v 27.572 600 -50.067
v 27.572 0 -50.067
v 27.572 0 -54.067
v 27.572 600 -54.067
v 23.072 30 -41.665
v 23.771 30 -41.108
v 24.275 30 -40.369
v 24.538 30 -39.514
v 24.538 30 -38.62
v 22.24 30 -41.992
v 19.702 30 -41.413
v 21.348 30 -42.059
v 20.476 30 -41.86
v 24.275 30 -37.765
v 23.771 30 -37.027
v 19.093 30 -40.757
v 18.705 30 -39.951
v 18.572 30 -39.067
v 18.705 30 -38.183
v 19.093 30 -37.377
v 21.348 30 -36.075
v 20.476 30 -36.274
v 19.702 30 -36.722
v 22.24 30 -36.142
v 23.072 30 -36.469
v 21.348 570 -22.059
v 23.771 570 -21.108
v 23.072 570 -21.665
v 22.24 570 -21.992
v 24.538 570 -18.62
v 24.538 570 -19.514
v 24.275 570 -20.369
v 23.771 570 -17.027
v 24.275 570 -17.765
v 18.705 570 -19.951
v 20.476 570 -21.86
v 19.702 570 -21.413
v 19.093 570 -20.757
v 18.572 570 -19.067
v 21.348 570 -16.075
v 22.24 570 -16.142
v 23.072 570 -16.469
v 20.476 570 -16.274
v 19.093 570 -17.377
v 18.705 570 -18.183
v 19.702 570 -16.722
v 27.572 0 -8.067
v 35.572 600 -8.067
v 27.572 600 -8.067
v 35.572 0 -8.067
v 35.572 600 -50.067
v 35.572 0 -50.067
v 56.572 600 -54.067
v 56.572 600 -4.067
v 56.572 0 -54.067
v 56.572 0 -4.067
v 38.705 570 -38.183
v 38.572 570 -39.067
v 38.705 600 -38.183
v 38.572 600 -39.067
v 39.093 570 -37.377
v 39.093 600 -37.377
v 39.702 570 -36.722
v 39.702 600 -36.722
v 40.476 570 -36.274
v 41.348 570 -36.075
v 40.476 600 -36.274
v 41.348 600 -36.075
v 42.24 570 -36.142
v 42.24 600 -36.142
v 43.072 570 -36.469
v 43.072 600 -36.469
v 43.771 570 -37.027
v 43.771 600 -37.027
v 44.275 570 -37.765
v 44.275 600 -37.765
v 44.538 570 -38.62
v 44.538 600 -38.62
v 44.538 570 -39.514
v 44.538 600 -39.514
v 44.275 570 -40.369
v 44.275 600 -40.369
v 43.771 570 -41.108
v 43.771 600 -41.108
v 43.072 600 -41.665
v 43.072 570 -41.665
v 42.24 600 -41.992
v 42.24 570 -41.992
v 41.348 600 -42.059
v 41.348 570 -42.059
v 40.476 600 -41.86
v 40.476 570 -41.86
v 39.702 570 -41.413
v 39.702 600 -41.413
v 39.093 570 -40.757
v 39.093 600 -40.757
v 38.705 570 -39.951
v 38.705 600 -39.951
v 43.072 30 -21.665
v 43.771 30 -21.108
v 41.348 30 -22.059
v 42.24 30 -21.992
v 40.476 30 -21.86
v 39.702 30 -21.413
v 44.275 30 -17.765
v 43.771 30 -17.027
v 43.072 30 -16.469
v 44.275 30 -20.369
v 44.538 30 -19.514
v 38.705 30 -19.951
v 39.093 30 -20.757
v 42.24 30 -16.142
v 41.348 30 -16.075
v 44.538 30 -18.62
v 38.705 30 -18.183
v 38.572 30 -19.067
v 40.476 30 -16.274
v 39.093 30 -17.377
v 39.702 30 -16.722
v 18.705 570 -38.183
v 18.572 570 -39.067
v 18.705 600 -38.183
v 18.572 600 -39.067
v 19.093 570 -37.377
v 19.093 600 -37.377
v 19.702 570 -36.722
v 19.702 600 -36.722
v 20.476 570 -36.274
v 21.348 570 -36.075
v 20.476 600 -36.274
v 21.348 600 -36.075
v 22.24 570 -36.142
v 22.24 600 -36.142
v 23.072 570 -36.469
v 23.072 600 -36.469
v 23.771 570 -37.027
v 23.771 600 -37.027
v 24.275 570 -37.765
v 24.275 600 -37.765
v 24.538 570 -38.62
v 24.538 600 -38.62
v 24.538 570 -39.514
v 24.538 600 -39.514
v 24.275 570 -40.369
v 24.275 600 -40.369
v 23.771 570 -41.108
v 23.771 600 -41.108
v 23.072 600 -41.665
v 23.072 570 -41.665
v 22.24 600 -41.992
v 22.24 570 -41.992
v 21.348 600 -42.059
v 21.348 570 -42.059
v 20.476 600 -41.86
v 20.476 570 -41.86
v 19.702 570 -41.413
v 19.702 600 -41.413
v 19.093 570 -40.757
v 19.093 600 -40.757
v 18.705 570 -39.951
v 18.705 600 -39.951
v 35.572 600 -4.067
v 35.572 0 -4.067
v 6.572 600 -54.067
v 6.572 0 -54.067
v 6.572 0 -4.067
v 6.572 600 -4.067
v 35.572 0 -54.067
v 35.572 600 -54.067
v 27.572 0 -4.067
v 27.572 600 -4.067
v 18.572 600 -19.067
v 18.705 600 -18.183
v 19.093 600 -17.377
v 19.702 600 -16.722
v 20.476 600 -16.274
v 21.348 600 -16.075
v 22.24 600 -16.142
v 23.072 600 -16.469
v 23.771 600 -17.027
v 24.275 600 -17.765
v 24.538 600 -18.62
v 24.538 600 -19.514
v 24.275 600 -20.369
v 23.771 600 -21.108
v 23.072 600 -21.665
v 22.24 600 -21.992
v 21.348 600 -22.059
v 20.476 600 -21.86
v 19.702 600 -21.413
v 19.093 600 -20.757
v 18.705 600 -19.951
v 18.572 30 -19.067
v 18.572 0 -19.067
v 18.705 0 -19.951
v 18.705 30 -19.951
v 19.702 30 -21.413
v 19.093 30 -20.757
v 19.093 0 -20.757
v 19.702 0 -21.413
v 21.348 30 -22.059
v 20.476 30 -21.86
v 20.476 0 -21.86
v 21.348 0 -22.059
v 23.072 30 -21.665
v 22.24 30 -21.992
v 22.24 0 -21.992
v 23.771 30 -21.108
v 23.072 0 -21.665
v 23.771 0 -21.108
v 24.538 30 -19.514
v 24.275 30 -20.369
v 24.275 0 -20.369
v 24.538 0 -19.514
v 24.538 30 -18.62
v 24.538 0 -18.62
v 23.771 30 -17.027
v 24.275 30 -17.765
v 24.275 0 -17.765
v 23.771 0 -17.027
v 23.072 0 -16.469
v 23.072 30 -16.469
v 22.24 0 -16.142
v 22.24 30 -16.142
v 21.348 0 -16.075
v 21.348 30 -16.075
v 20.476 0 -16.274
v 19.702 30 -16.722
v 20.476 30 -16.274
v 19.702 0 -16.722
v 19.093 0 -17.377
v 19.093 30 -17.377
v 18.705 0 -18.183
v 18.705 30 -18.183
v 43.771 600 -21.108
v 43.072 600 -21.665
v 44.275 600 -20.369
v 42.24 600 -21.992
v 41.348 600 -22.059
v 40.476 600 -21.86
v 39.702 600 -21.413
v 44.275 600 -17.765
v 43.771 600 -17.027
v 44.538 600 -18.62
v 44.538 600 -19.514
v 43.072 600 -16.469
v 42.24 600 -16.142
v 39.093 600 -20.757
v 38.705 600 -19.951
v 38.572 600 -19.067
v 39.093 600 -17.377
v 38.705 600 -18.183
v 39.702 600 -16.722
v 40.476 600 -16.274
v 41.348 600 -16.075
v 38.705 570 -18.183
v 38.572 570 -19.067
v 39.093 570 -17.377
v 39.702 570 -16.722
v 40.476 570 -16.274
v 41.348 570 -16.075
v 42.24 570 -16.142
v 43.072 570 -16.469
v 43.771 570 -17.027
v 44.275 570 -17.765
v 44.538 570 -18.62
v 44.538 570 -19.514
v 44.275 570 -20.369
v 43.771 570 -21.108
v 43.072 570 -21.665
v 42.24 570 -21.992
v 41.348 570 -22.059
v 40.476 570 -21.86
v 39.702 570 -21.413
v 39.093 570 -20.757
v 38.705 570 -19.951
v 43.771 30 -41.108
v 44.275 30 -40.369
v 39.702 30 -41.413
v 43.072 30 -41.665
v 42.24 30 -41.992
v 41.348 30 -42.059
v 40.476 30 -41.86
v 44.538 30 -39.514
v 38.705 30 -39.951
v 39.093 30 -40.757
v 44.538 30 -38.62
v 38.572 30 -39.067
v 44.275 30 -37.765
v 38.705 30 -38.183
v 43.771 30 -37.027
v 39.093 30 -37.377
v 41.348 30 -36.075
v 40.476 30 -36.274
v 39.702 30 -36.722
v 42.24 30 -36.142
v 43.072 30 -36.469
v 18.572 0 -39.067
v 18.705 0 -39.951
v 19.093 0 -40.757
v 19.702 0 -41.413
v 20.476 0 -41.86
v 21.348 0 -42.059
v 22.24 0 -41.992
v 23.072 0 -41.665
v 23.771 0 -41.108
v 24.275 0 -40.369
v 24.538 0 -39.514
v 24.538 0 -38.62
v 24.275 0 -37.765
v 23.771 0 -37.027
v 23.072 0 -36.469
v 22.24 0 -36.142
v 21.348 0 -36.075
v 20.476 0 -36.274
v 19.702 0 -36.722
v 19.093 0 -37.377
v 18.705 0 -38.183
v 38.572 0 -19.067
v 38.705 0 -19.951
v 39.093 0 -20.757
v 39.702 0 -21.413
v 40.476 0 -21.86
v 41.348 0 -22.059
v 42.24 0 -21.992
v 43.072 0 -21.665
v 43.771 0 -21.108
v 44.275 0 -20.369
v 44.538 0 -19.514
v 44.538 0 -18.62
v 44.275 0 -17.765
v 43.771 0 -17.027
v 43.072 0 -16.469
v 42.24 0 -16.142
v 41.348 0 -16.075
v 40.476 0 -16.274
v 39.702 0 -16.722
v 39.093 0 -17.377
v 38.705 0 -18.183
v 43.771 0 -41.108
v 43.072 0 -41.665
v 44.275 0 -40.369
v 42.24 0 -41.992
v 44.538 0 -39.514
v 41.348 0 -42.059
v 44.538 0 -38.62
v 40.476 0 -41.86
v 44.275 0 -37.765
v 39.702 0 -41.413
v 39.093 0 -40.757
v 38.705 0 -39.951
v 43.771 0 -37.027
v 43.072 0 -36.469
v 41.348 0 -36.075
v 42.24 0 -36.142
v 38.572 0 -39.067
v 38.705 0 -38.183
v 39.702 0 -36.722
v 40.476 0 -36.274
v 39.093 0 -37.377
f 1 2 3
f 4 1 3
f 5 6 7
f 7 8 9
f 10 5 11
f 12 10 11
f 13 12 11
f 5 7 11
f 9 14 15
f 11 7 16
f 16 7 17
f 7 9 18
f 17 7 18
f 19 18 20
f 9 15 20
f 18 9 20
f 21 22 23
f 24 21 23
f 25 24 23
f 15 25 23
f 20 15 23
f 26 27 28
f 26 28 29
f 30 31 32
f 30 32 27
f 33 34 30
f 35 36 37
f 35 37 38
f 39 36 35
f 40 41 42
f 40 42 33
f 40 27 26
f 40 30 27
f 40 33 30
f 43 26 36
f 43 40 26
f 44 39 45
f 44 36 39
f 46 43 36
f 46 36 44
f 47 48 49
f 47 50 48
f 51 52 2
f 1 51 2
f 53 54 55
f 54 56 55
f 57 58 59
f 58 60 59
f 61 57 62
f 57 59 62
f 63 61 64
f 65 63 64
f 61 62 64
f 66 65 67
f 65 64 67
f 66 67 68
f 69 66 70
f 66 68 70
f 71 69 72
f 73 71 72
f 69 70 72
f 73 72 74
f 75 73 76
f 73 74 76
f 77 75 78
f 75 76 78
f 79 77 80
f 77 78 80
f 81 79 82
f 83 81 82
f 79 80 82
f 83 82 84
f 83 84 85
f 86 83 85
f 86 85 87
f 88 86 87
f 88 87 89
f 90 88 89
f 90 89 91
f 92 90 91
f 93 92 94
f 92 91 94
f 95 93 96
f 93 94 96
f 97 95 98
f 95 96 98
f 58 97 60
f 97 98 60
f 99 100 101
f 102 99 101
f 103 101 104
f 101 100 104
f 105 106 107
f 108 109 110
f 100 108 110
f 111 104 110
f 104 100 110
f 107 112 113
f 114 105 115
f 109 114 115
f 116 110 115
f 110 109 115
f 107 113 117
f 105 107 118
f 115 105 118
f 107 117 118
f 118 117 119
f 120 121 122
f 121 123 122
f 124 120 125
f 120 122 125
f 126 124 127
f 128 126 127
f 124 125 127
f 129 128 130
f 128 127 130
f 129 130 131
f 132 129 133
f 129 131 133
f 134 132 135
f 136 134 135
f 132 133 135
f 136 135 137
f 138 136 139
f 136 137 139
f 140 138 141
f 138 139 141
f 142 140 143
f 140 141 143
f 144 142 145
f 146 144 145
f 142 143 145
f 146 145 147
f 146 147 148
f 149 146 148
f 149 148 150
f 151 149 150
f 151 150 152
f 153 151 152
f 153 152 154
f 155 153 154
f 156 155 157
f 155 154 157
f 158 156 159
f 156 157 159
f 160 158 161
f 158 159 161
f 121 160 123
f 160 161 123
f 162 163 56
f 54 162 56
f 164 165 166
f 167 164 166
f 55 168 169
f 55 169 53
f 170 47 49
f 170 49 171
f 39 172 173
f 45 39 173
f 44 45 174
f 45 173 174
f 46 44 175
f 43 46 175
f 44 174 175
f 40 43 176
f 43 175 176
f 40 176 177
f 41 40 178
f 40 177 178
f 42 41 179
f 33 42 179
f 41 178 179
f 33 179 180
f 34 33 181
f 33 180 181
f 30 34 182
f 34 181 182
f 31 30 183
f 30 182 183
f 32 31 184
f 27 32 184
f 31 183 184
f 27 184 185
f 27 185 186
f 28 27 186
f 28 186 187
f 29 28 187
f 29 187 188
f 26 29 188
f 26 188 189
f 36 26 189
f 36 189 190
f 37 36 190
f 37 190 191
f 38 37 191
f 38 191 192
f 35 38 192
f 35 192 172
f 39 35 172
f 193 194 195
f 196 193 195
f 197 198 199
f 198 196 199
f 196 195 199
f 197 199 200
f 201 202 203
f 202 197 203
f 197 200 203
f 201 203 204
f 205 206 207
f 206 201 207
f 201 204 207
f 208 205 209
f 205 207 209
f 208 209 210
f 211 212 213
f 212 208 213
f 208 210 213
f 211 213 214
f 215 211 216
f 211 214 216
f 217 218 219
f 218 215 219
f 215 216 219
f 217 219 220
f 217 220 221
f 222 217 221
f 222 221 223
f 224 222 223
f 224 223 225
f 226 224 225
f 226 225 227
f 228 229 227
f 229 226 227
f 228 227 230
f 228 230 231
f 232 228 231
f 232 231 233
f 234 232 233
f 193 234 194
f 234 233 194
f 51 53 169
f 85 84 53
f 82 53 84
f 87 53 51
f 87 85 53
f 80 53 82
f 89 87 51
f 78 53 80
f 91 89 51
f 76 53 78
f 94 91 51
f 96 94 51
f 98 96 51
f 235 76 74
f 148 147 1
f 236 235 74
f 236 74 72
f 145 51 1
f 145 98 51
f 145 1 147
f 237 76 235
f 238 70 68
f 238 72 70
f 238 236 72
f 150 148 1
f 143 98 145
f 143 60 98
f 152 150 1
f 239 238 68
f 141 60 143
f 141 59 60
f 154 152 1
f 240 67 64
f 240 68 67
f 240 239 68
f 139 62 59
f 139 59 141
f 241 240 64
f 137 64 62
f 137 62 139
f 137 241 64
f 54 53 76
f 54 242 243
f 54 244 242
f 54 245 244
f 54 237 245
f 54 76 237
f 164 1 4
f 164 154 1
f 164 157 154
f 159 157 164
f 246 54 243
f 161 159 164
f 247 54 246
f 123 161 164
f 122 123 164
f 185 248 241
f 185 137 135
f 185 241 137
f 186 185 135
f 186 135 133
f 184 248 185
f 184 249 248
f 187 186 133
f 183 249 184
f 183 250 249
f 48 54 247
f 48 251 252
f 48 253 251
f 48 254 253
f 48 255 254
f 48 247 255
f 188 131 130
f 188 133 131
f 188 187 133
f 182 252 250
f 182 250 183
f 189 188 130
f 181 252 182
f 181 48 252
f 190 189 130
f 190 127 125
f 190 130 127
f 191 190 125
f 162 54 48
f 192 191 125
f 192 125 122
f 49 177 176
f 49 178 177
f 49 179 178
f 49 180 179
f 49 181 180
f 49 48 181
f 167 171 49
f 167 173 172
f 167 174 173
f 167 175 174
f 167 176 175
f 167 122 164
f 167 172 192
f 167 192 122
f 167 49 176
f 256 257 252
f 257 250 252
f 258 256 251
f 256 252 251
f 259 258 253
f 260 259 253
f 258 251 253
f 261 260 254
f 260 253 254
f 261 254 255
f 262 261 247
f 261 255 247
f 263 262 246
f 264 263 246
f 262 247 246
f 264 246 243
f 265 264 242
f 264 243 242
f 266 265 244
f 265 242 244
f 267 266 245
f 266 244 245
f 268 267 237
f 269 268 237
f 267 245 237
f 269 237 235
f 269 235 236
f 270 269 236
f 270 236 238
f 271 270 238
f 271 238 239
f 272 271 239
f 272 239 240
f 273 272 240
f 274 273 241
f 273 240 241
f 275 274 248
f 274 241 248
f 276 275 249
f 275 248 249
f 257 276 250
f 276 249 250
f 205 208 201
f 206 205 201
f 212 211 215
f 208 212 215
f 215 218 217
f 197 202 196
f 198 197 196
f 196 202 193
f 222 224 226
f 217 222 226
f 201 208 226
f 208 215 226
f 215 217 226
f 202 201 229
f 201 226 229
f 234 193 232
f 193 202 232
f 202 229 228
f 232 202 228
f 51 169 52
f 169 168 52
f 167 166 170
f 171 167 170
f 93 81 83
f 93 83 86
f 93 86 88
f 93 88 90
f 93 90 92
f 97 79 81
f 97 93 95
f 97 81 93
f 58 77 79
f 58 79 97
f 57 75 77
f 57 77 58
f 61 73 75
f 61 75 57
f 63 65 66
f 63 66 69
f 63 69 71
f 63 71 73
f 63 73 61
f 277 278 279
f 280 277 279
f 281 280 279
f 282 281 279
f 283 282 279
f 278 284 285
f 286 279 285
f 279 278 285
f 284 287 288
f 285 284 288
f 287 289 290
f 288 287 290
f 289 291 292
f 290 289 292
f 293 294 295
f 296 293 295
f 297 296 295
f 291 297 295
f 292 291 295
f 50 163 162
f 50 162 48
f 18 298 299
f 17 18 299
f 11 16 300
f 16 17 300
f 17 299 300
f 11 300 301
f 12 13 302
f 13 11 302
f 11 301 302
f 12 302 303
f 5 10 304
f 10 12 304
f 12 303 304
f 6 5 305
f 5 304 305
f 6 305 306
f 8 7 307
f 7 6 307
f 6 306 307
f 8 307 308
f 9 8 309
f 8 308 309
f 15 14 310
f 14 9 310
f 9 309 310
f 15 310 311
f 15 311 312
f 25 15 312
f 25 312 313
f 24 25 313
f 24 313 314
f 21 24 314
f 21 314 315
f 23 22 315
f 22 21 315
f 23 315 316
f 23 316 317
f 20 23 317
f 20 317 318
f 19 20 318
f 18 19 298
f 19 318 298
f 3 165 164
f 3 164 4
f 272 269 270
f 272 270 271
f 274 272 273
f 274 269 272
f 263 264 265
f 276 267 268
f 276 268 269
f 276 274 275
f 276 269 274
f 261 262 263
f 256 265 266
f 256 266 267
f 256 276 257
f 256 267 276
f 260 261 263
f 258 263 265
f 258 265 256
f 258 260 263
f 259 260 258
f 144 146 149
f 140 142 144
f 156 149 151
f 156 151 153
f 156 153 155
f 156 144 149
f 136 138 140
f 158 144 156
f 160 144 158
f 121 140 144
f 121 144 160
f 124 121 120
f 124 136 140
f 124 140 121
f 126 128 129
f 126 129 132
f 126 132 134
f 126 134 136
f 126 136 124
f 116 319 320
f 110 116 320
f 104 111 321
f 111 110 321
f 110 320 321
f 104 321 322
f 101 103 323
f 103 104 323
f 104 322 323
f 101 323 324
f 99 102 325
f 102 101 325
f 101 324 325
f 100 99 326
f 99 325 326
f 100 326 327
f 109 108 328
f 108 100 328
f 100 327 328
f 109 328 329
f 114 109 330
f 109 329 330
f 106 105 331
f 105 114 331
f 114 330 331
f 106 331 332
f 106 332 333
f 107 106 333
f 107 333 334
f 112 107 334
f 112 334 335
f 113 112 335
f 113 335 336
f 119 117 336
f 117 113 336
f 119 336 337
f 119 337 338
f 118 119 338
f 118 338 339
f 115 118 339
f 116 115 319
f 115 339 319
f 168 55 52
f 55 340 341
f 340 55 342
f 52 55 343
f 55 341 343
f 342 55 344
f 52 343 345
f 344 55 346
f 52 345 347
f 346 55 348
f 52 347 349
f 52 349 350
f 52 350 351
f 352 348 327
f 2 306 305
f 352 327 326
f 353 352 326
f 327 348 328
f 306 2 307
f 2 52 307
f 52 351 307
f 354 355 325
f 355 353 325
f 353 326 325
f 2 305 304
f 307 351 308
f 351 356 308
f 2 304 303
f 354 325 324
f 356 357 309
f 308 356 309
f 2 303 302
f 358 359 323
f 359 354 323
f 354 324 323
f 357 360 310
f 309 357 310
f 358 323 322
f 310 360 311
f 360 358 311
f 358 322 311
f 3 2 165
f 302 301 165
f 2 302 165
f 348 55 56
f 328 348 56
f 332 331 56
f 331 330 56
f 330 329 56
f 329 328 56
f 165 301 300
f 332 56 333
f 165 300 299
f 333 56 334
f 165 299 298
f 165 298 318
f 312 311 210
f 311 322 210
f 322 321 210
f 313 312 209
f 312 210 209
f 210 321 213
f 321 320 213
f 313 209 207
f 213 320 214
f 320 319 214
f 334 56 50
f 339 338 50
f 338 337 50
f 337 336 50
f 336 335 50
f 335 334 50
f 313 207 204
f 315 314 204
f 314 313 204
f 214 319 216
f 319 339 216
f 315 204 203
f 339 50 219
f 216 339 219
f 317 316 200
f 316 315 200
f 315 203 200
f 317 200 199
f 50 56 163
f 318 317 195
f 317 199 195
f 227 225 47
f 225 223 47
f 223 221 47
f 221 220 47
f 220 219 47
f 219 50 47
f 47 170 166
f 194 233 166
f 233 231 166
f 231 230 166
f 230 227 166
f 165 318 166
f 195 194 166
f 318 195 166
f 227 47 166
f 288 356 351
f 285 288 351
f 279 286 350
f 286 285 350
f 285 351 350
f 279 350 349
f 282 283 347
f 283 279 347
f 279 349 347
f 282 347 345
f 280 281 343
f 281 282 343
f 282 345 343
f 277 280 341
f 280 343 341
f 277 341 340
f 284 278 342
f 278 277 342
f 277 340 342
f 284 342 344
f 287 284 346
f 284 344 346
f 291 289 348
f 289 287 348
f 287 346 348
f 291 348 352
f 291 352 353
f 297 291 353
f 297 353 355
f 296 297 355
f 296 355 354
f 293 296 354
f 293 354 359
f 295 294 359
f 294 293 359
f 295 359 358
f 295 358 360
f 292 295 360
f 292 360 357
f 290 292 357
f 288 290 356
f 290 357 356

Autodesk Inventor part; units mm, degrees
ref_plane "YZ Plane" through (0, 0, 0) normal (1, 0, 0) x (0, 1, 0)
ref_plane "XZ Plane" through (0, 0, 0) normal (0, 1, 0) x (-1, 0, 0)
ref_plane "XY Plane" through (0, 0, 0) normal (0, 0, 1) x (1, 0, 0)
sketch "Sketch3" plane through (0, 0, 0) normal (0, 1, 0) x (-1, 0, 0)
  line L0 (-56.572, -4.0671) -> (-56.572, -54.0671)
  line L1 (-6.572, -54.0671) -> (-6.572, -4.0671)
  line L2 (-6.572, -4.0671) -> (-35.572, -4.0671)
  line L3 (-35.572, -4.0671) -> (-35.572, -8.0671)
  line L4 (-35.572, -8.0671) -> (-27.572, -8.0671)
  line L5 (-27.572, -8.0671) -> (-27.572, -4.0671)
  line L6 (-27.572, -4.0671) -> (-56.572, -4.0671)
  line L7 (-6.572, -29.0671) -> (-22.7851, -29.0671) construction
  line L8 (-6.572, -54.0671) -> (-35.572, -54.0671)
  line L9 (-35.572, -54.0671) -> (-35.572, -50.0671)
  line L10 (-35.572, -50.0671) -> (-27.572, -50.0671)
  line L11 (-27.572, -50.0671) -> (-27.572, -54.0671)
  line L12 (-27.572, -54.0671) -> (-56.572, -54.0671)
  line L13 (-21.572, -4.0671) -> (-21.572, -19.0671) construction
  line L14 (-21.572, -19.0671) -> (-6.572, -19.0671) construction
  line L15 (-56.572, -19.0671) -> (-41.572, -19.0671) construction
  line L16 (-56.572, -39.0671) -> (-41.572, -39.0671) construction
  line L17 (-21.572, -54.0671) -> (-21.572, -39.0671) construction
  line L18 (-21.572, -39.0671) -> (-6.572, -39.0671) construction
  circle A0 centre (-21.572, -19.0671) radius 3
  circle A1 centre (-41.572, -19.0671) radius 3
  circle A2 centre (-41.572, -39.0671) radius 3
  circle A3 centre (-21.572, -39.0671) radius 3
  point P0 (-35.572, -4.0671)
  dimension "d36" = 50
  dimension "d37" = 50
  dimension "d38" = 4
  dimension "d40" = 15
  dimension "d41" = 6
  dimension "d46" = 8
extrude "Extrusion3" add sketch "Sketch3" along normal blind 600 contours L6 L3 L4 L5 L2 L1 L8 L11 L10 L9 L12 L0 | A0 | A1 | A2 | A3
extrude "Extrusion6" cut sketch "Sketch3" along normal blind 30 contours A0 | A1 | A2 | A3
extrude "Extrusion7" cut sketch "Sketch3" against normal blind 30 from surface at 600 contours A0 | A1 | A2 | A3
equation "\"d36\" = inner_leg_width"
equation "\"d37\" = inner_leg_width"
equation "\"d38\" = cabel_shaft_size"
equation "\"d40\" = edge_to_hole"
equation "\"d41\" = hole_diameter"
equation "\"d46\" = 2 * cabel_shaft_size"
equation "\"d12\" = height"
equation "\"d42\" = hole_depth"
equation "\"d44\" = hole_depth"
equation "\"cabel_shaft_size\" = 4"
equation "\"edge_to_hole\" = 15"
equation "\"hole_diameter\" = 6"
equation "\"height\" = 600"
equation "\"inner_leg_width\" = 50"
equation "\"hole_depth\" = 30"
properties part number "1_inner_leg"
